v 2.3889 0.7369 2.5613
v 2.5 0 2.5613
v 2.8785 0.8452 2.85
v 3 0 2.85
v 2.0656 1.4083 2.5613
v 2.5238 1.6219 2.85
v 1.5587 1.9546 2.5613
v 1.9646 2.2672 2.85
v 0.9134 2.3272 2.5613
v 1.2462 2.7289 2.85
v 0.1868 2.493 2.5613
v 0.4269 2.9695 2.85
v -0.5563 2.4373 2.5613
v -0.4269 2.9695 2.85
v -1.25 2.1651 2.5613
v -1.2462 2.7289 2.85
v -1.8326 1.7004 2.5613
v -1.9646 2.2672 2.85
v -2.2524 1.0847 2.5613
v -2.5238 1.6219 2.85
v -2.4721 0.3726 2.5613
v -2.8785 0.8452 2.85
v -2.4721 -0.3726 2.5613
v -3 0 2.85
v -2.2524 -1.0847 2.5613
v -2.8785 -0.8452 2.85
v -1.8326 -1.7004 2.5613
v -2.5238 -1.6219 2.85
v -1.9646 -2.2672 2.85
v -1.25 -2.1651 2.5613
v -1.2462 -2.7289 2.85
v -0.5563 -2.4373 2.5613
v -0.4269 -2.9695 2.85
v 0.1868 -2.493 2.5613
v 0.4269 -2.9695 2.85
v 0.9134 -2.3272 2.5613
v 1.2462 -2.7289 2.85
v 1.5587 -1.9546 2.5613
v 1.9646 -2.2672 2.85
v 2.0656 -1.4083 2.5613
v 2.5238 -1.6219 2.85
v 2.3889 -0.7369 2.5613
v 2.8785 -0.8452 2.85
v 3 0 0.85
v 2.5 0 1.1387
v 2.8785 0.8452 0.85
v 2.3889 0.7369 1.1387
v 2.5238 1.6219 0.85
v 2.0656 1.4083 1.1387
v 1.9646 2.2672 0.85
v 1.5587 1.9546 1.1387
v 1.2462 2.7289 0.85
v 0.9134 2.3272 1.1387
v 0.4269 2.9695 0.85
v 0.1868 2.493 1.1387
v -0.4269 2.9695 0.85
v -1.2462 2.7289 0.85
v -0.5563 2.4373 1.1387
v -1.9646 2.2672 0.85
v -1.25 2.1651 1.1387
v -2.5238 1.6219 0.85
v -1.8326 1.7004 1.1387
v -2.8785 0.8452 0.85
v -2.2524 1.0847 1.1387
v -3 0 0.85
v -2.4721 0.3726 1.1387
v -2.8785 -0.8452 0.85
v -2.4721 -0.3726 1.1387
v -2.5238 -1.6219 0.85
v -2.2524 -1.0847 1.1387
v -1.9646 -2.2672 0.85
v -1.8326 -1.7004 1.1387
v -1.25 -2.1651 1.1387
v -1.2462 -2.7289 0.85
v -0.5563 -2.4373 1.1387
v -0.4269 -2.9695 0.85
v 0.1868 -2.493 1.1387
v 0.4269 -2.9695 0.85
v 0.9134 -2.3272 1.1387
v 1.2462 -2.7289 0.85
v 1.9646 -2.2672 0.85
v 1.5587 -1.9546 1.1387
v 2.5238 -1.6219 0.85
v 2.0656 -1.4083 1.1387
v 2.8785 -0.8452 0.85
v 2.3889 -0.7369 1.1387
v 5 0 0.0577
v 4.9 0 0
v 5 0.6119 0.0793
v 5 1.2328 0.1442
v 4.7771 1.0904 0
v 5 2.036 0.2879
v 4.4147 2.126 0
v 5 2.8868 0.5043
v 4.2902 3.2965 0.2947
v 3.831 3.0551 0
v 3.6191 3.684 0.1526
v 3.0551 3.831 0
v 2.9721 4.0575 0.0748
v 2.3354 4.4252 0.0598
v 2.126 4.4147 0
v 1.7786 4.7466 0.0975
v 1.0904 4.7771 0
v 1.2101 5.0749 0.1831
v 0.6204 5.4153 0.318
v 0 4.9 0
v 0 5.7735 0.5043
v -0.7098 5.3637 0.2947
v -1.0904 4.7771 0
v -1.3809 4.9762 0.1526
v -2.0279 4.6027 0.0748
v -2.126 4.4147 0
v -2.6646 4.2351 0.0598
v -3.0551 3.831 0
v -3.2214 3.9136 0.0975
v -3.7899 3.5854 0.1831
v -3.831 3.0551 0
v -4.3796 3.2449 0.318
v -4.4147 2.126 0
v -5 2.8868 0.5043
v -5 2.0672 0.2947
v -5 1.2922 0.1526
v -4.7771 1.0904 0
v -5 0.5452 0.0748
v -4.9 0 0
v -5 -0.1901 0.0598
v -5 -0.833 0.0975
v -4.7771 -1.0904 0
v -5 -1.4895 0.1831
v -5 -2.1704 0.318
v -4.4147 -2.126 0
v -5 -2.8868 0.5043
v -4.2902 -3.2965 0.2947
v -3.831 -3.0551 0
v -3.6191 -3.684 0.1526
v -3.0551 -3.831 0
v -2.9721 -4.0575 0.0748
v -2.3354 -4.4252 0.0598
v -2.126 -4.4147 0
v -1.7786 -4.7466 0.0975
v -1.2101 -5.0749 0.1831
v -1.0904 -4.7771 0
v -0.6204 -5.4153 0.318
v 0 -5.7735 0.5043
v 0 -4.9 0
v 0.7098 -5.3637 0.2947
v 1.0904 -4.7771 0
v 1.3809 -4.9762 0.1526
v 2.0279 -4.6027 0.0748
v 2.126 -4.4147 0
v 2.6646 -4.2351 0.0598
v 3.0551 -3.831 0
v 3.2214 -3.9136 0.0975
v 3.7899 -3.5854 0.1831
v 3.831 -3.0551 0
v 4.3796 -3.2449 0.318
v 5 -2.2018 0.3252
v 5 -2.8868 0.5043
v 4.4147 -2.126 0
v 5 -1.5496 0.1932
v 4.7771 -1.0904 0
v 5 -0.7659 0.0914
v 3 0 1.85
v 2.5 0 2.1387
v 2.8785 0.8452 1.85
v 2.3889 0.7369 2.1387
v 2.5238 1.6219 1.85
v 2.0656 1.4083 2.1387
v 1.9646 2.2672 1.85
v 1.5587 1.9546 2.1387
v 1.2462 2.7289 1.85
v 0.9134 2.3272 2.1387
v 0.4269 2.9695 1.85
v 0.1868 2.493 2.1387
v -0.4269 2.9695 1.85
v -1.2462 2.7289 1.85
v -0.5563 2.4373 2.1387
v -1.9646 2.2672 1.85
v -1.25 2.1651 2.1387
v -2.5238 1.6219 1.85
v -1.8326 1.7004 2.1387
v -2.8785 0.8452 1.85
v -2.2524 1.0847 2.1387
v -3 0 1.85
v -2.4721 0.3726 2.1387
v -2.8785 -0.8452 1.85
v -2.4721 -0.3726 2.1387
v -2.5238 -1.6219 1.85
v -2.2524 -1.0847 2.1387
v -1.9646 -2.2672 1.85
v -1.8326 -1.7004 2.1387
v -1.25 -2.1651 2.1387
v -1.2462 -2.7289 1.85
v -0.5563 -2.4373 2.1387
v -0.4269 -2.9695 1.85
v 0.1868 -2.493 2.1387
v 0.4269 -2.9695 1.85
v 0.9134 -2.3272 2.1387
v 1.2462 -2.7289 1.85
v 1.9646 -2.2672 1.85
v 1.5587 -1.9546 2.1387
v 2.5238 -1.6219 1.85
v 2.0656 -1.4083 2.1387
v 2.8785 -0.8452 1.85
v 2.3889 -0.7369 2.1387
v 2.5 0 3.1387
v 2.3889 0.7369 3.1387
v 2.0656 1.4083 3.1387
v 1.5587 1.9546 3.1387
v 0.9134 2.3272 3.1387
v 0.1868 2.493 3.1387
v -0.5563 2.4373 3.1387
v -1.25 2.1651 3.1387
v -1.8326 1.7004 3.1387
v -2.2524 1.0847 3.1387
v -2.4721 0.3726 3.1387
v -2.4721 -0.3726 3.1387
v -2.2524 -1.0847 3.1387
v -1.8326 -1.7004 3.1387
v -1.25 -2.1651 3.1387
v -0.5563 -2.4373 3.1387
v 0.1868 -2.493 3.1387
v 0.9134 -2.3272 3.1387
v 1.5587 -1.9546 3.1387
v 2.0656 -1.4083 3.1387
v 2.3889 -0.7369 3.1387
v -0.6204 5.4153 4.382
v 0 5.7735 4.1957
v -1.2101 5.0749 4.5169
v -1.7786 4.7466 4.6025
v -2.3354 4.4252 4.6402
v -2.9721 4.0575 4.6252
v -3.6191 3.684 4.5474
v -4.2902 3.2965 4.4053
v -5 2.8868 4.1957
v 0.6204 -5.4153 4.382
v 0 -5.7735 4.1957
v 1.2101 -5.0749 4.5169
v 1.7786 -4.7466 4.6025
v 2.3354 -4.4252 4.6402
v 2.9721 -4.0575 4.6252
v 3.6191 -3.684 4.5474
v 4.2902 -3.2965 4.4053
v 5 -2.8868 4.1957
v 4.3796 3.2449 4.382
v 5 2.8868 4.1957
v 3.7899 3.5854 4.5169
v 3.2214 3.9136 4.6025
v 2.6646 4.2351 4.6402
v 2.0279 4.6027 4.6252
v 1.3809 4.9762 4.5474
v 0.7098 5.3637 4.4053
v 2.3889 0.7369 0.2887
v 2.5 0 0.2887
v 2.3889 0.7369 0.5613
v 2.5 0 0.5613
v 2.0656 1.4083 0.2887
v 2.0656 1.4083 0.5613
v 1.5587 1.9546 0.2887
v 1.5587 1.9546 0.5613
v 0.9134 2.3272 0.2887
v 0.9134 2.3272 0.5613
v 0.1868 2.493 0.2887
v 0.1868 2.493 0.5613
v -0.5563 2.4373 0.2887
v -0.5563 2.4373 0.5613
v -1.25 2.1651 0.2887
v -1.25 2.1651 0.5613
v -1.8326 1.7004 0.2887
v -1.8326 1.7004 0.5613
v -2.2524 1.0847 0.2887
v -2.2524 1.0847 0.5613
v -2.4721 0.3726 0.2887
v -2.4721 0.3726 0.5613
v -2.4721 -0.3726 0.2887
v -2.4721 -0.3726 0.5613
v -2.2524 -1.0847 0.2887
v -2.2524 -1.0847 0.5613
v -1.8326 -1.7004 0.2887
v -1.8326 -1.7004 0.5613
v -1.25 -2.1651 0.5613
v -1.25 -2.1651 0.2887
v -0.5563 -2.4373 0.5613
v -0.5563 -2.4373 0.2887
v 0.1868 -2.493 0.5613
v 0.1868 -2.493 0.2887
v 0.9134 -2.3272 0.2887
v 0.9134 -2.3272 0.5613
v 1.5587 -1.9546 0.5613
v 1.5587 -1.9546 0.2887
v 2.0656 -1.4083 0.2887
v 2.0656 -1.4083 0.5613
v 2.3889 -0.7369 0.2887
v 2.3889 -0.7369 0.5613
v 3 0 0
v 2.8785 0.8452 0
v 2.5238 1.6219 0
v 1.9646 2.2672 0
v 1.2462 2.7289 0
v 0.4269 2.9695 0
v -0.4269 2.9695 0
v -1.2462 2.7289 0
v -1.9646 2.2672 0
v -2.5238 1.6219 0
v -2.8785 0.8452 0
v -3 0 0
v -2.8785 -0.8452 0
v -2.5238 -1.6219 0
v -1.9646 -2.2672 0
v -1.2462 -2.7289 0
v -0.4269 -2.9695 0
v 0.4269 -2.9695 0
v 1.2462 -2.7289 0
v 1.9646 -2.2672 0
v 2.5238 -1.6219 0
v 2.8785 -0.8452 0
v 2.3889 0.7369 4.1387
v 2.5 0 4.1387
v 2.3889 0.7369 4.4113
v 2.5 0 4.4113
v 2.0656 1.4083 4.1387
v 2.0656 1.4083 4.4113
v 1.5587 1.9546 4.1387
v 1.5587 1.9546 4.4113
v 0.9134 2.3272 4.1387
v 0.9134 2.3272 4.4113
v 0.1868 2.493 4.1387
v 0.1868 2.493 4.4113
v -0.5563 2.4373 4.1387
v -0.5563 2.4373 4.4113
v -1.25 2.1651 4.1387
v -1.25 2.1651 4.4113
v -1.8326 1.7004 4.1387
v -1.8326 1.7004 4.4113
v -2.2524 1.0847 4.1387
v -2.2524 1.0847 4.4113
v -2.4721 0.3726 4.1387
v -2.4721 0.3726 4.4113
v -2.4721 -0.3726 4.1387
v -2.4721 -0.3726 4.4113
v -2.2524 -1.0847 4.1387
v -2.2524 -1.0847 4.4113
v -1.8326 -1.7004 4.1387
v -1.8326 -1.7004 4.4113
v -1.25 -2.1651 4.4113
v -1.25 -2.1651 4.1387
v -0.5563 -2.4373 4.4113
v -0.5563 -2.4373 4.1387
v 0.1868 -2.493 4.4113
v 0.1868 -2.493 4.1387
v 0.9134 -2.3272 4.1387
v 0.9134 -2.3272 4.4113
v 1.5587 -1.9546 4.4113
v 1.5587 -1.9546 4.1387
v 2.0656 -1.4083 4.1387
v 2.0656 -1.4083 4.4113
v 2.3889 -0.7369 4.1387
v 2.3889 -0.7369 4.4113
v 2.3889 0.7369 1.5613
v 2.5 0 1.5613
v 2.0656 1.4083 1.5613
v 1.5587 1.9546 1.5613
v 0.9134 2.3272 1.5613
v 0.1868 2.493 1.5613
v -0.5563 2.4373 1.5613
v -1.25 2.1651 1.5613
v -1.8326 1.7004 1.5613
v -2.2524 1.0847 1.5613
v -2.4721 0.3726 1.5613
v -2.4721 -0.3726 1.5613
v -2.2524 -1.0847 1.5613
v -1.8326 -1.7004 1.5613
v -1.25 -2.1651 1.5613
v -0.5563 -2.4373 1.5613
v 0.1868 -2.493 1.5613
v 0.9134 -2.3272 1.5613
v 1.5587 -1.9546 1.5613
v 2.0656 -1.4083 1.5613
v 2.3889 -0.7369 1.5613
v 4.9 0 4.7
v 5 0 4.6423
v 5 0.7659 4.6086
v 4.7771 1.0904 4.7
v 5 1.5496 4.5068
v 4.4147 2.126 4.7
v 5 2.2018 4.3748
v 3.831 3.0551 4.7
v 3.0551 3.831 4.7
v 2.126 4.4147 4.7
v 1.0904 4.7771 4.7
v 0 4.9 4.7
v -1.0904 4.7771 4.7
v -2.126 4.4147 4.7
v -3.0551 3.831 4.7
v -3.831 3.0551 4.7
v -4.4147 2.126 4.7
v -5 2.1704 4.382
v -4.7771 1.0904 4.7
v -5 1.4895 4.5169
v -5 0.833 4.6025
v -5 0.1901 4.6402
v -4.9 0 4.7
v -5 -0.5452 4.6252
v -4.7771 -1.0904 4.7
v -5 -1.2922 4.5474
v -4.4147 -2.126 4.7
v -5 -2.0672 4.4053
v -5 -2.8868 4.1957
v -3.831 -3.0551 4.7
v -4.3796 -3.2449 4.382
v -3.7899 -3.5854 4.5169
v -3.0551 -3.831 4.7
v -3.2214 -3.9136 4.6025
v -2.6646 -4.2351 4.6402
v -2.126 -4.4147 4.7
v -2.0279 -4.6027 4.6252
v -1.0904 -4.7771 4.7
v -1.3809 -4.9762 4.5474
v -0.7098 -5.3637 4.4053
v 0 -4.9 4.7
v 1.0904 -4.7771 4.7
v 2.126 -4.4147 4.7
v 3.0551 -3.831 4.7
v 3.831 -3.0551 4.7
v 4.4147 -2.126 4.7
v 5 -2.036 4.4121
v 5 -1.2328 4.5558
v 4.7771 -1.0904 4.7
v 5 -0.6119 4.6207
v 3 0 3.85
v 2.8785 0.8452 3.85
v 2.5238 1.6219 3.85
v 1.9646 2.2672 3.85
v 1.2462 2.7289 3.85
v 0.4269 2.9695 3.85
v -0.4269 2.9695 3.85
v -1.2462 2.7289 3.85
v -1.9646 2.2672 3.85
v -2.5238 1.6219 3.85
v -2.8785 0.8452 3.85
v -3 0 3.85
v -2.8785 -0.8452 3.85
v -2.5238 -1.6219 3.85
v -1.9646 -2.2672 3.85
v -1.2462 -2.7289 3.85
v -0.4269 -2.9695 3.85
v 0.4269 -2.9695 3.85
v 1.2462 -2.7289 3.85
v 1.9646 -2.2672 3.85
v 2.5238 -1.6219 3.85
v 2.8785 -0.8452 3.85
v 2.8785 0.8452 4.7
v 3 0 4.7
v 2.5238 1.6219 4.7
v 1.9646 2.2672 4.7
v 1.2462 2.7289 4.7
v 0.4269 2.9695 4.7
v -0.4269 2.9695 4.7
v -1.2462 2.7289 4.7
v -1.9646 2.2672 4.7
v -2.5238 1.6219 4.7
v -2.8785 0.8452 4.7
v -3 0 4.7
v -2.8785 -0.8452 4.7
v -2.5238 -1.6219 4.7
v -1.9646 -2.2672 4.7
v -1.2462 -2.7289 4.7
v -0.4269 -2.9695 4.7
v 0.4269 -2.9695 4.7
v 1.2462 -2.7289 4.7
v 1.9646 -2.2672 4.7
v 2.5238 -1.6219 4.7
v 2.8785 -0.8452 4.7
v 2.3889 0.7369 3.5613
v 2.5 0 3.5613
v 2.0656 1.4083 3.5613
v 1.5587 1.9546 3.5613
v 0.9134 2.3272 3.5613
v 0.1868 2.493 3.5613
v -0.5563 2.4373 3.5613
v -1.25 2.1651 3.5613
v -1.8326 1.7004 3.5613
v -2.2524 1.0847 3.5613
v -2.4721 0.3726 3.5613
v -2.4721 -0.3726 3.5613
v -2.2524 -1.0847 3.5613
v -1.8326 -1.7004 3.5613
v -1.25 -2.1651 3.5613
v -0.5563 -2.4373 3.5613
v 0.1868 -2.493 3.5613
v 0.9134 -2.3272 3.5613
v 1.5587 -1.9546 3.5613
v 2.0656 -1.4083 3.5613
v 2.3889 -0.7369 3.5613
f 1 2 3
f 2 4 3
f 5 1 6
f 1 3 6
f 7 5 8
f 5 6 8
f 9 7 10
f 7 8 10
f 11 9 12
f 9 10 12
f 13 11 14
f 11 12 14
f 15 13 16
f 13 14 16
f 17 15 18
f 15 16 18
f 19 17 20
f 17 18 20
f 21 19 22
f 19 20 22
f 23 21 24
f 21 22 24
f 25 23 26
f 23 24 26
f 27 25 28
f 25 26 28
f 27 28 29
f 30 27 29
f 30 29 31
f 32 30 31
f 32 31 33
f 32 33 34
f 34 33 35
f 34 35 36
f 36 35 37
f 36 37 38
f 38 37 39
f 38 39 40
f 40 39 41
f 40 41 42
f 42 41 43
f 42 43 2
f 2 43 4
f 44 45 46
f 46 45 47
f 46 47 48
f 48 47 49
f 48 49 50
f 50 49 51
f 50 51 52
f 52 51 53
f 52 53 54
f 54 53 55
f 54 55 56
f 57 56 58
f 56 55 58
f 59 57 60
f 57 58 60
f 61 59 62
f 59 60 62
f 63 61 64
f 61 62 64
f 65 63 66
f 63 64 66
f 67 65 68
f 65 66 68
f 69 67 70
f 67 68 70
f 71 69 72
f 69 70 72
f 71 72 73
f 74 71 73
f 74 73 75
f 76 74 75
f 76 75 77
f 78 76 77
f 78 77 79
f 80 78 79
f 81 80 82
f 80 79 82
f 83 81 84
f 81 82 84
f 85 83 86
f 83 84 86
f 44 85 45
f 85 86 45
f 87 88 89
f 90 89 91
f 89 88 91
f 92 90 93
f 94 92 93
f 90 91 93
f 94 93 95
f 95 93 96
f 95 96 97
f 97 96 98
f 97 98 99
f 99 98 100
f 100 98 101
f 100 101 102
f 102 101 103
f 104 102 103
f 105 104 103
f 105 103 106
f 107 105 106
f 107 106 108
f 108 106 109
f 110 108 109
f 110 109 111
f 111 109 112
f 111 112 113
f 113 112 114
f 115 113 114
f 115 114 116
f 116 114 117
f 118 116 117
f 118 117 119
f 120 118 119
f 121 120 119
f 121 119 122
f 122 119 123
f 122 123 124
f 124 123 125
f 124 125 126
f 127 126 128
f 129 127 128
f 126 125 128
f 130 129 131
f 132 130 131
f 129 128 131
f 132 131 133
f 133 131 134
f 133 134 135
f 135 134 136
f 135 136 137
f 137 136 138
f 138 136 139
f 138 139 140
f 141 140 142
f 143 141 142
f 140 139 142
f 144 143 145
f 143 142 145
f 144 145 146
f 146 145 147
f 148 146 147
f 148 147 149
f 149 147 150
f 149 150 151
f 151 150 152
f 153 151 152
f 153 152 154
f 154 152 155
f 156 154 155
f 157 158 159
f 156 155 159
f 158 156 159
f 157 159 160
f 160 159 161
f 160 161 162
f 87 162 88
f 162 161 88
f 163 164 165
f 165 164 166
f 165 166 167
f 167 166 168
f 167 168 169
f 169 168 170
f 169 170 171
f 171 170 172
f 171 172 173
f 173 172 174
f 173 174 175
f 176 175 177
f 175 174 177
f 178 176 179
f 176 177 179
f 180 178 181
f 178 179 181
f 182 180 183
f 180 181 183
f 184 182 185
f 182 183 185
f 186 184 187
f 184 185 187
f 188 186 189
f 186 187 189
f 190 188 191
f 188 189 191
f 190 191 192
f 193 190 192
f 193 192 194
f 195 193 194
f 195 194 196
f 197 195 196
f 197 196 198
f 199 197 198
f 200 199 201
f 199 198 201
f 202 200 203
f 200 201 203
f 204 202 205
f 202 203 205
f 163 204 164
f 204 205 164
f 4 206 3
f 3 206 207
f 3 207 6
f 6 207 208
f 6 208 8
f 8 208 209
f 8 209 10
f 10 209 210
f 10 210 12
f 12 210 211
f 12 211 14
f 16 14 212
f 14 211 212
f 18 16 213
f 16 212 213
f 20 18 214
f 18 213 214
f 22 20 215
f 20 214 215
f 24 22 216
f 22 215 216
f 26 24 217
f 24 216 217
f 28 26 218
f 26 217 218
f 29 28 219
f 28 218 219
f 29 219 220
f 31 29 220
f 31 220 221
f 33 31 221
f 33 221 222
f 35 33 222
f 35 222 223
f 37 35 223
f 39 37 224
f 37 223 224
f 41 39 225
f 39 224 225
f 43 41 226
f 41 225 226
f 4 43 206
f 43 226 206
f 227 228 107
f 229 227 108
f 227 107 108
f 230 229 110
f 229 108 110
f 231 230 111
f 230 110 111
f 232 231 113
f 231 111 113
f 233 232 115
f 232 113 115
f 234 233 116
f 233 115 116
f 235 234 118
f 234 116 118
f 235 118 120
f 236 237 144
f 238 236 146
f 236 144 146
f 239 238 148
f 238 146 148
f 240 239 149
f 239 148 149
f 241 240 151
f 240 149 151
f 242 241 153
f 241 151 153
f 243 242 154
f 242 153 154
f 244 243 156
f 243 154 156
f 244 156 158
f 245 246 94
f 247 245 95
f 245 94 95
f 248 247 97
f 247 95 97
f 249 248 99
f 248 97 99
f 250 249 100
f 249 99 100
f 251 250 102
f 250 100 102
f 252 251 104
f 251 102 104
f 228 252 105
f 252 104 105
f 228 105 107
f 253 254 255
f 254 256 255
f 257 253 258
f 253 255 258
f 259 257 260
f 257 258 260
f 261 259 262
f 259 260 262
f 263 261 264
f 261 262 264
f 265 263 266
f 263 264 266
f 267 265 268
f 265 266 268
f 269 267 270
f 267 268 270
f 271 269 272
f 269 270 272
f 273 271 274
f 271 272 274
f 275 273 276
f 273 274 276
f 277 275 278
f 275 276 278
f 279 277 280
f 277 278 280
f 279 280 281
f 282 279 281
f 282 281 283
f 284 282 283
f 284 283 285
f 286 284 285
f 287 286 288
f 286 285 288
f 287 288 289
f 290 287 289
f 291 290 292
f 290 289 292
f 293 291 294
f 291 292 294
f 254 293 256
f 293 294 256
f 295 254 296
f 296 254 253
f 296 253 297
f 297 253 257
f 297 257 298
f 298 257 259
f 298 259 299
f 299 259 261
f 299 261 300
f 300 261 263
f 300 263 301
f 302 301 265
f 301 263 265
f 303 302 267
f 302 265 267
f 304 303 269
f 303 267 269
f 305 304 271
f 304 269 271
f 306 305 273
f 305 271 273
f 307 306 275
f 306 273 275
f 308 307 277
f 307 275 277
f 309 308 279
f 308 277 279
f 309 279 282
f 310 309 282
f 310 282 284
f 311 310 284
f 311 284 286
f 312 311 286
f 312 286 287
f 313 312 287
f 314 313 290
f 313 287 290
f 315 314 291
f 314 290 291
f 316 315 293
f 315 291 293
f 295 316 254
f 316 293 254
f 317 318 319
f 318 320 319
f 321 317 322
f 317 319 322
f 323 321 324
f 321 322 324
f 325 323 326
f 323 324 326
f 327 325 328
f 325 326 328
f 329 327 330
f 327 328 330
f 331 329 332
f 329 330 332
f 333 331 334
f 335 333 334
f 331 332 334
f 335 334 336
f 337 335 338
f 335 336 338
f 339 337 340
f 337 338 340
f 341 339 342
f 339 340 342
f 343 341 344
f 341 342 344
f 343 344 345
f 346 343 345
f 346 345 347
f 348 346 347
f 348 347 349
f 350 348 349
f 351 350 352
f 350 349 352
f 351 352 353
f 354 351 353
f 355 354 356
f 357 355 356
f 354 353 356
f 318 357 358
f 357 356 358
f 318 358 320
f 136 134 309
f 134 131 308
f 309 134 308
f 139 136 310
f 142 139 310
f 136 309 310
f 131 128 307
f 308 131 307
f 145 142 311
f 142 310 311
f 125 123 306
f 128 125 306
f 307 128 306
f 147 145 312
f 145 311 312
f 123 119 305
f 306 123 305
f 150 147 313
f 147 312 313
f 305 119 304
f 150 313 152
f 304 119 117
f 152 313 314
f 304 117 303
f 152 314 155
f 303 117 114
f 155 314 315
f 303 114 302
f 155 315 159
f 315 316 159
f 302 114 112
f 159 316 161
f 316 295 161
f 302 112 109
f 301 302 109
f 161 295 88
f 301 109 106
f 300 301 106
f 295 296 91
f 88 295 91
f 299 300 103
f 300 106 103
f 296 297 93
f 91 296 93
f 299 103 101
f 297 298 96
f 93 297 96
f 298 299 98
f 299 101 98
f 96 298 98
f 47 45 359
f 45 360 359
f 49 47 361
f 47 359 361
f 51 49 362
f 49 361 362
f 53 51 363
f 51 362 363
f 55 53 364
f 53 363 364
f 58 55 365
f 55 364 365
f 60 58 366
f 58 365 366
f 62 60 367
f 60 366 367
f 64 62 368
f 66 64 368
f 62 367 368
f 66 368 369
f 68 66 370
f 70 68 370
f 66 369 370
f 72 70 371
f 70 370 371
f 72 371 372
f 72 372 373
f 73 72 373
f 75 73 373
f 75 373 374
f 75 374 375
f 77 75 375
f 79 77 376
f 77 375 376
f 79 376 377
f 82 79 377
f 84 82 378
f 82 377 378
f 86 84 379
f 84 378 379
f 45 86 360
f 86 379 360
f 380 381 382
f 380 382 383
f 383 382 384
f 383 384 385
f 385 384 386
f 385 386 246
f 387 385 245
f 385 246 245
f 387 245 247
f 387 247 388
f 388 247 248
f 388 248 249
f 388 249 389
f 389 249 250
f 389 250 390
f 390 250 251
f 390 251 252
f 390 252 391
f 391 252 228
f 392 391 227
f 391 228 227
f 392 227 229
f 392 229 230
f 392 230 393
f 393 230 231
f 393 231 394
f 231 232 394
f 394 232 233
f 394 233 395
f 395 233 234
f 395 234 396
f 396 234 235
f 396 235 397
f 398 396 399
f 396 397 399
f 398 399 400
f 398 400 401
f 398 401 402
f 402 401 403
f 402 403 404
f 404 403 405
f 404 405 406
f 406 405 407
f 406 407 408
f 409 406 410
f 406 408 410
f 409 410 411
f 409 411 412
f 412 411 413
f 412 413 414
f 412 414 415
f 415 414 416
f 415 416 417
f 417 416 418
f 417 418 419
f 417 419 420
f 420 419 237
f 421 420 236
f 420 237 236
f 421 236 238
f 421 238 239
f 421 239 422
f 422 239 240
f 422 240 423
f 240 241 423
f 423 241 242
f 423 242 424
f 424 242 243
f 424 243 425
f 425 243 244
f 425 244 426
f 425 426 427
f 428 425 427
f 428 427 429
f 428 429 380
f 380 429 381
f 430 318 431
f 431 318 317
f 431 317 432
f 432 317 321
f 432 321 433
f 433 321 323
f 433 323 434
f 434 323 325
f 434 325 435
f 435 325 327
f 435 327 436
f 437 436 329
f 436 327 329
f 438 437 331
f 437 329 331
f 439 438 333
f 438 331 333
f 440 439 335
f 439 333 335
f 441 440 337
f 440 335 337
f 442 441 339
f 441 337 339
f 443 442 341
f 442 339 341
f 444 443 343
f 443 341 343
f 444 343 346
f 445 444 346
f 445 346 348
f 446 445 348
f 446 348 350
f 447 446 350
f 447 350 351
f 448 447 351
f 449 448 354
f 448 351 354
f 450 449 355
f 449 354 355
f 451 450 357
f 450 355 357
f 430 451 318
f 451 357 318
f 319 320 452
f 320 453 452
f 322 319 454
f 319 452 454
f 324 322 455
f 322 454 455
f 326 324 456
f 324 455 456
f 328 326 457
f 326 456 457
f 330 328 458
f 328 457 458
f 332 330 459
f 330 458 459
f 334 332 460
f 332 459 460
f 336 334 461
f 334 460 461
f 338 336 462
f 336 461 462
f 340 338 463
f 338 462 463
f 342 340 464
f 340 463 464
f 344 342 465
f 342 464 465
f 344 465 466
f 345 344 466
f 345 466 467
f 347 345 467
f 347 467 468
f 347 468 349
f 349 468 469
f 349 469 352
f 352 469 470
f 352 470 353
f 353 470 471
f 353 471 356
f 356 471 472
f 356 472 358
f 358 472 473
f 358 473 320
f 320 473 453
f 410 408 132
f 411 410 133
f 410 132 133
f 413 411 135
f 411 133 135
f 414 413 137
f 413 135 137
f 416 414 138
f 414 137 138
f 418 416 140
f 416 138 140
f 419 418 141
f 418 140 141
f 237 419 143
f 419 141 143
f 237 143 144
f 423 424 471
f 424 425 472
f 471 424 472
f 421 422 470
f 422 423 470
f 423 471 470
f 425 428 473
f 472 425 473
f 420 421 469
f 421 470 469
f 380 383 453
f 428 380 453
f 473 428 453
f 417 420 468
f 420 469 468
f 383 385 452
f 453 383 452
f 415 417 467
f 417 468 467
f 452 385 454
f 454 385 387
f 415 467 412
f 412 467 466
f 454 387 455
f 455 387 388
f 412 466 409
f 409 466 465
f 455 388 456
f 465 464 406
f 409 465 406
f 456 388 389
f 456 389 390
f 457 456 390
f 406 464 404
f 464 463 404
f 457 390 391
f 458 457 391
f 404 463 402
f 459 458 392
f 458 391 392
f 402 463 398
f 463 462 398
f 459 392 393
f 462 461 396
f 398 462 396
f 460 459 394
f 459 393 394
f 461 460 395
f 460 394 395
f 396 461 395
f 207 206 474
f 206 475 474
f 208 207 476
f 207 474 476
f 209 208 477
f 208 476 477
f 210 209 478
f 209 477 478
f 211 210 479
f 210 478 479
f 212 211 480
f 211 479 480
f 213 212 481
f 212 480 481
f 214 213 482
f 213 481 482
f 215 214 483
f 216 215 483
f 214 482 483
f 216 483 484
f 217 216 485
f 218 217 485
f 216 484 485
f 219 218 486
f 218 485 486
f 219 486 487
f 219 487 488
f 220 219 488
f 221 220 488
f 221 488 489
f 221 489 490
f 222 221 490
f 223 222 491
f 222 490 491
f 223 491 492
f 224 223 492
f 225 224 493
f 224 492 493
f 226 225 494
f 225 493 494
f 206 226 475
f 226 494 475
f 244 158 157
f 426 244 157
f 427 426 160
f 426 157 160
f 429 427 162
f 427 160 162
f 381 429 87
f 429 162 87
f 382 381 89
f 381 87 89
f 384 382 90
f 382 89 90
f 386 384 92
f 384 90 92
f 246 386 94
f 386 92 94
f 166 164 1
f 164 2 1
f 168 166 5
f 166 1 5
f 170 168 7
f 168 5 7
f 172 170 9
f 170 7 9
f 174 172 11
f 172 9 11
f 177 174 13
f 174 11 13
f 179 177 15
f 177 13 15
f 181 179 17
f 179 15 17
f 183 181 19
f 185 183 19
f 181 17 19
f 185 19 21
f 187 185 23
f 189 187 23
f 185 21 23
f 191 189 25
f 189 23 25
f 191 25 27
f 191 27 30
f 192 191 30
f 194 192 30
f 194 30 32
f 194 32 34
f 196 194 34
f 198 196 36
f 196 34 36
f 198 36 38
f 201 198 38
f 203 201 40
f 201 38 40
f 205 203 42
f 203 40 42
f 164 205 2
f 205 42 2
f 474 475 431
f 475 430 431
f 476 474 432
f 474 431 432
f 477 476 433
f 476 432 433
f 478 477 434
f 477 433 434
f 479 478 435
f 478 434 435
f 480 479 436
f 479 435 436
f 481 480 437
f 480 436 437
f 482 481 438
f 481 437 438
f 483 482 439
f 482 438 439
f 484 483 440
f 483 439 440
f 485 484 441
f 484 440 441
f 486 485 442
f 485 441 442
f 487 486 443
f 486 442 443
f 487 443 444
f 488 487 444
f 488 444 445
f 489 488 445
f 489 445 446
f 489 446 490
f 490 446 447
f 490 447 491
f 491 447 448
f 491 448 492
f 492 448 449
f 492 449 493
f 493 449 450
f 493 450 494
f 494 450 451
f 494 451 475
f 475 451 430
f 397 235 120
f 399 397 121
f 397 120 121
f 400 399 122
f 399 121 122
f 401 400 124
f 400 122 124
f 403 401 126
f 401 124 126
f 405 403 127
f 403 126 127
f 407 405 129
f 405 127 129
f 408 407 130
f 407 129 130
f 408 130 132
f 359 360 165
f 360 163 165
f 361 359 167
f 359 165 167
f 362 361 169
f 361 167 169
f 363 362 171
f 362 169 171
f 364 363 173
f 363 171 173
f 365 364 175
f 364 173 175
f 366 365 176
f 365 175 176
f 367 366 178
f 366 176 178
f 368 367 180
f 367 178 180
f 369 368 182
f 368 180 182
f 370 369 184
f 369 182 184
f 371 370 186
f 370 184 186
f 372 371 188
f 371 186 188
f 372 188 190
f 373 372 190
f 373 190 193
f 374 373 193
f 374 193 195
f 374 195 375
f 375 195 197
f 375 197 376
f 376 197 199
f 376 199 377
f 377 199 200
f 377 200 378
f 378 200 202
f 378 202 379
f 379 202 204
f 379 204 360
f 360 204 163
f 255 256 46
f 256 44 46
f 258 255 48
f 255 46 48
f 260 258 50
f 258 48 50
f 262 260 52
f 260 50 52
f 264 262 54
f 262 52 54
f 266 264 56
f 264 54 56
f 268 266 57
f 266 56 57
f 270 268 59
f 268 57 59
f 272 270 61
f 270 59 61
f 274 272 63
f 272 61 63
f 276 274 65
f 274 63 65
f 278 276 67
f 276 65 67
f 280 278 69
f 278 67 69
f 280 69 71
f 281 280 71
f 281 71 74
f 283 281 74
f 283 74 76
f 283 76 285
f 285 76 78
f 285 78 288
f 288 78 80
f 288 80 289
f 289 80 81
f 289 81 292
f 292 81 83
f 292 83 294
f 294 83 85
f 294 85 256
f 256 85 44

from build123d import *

# Parameters (mm, degrees)
EXTRUDE_DEPTH = 4.7


with BuildPart() as revolve_body:
    # Sketch001 → Revolve (revolve)
    with BuildSketch(Plane.XZ):
        Polygon((3, 0), (2.5, 0.288675), (2.5, 0.561325), (3, 0.85), (2.5, 1.138675), (2.5, 1.561325), (3, 1.85), (2.5, 2.138675), (2.5, 2.561325), (3, 2.85), (2.5, 3.138675), (2.5, 3.561325), (3, 3.85), (2.5, 4.138675), (2.5, 4.411325), (3, 4.7), (4.9, 4.7), (6, 4.064915), (6, 0.635085), (4.9, 0), align=None)
    revolve(axis=Axis((0, 0, 0), (0, 0, 1)))


with BuildPart() as common:
    # Sketch → Extrude (new body)
    with BuildSketch(Plane.XY):
        Polygon((0, 5.773503), (-5, 2.886751), (-5, -2.886751), (0, -5.773503), (5, -2.886751), (5, 2.886751), align=None)
    extrude(amount=EXTRUDE_DEPTH)

    # Common: intersect Revolve body
    add(revolve_body.part, mode=Mode.INTERSECT)


solid = common.part
